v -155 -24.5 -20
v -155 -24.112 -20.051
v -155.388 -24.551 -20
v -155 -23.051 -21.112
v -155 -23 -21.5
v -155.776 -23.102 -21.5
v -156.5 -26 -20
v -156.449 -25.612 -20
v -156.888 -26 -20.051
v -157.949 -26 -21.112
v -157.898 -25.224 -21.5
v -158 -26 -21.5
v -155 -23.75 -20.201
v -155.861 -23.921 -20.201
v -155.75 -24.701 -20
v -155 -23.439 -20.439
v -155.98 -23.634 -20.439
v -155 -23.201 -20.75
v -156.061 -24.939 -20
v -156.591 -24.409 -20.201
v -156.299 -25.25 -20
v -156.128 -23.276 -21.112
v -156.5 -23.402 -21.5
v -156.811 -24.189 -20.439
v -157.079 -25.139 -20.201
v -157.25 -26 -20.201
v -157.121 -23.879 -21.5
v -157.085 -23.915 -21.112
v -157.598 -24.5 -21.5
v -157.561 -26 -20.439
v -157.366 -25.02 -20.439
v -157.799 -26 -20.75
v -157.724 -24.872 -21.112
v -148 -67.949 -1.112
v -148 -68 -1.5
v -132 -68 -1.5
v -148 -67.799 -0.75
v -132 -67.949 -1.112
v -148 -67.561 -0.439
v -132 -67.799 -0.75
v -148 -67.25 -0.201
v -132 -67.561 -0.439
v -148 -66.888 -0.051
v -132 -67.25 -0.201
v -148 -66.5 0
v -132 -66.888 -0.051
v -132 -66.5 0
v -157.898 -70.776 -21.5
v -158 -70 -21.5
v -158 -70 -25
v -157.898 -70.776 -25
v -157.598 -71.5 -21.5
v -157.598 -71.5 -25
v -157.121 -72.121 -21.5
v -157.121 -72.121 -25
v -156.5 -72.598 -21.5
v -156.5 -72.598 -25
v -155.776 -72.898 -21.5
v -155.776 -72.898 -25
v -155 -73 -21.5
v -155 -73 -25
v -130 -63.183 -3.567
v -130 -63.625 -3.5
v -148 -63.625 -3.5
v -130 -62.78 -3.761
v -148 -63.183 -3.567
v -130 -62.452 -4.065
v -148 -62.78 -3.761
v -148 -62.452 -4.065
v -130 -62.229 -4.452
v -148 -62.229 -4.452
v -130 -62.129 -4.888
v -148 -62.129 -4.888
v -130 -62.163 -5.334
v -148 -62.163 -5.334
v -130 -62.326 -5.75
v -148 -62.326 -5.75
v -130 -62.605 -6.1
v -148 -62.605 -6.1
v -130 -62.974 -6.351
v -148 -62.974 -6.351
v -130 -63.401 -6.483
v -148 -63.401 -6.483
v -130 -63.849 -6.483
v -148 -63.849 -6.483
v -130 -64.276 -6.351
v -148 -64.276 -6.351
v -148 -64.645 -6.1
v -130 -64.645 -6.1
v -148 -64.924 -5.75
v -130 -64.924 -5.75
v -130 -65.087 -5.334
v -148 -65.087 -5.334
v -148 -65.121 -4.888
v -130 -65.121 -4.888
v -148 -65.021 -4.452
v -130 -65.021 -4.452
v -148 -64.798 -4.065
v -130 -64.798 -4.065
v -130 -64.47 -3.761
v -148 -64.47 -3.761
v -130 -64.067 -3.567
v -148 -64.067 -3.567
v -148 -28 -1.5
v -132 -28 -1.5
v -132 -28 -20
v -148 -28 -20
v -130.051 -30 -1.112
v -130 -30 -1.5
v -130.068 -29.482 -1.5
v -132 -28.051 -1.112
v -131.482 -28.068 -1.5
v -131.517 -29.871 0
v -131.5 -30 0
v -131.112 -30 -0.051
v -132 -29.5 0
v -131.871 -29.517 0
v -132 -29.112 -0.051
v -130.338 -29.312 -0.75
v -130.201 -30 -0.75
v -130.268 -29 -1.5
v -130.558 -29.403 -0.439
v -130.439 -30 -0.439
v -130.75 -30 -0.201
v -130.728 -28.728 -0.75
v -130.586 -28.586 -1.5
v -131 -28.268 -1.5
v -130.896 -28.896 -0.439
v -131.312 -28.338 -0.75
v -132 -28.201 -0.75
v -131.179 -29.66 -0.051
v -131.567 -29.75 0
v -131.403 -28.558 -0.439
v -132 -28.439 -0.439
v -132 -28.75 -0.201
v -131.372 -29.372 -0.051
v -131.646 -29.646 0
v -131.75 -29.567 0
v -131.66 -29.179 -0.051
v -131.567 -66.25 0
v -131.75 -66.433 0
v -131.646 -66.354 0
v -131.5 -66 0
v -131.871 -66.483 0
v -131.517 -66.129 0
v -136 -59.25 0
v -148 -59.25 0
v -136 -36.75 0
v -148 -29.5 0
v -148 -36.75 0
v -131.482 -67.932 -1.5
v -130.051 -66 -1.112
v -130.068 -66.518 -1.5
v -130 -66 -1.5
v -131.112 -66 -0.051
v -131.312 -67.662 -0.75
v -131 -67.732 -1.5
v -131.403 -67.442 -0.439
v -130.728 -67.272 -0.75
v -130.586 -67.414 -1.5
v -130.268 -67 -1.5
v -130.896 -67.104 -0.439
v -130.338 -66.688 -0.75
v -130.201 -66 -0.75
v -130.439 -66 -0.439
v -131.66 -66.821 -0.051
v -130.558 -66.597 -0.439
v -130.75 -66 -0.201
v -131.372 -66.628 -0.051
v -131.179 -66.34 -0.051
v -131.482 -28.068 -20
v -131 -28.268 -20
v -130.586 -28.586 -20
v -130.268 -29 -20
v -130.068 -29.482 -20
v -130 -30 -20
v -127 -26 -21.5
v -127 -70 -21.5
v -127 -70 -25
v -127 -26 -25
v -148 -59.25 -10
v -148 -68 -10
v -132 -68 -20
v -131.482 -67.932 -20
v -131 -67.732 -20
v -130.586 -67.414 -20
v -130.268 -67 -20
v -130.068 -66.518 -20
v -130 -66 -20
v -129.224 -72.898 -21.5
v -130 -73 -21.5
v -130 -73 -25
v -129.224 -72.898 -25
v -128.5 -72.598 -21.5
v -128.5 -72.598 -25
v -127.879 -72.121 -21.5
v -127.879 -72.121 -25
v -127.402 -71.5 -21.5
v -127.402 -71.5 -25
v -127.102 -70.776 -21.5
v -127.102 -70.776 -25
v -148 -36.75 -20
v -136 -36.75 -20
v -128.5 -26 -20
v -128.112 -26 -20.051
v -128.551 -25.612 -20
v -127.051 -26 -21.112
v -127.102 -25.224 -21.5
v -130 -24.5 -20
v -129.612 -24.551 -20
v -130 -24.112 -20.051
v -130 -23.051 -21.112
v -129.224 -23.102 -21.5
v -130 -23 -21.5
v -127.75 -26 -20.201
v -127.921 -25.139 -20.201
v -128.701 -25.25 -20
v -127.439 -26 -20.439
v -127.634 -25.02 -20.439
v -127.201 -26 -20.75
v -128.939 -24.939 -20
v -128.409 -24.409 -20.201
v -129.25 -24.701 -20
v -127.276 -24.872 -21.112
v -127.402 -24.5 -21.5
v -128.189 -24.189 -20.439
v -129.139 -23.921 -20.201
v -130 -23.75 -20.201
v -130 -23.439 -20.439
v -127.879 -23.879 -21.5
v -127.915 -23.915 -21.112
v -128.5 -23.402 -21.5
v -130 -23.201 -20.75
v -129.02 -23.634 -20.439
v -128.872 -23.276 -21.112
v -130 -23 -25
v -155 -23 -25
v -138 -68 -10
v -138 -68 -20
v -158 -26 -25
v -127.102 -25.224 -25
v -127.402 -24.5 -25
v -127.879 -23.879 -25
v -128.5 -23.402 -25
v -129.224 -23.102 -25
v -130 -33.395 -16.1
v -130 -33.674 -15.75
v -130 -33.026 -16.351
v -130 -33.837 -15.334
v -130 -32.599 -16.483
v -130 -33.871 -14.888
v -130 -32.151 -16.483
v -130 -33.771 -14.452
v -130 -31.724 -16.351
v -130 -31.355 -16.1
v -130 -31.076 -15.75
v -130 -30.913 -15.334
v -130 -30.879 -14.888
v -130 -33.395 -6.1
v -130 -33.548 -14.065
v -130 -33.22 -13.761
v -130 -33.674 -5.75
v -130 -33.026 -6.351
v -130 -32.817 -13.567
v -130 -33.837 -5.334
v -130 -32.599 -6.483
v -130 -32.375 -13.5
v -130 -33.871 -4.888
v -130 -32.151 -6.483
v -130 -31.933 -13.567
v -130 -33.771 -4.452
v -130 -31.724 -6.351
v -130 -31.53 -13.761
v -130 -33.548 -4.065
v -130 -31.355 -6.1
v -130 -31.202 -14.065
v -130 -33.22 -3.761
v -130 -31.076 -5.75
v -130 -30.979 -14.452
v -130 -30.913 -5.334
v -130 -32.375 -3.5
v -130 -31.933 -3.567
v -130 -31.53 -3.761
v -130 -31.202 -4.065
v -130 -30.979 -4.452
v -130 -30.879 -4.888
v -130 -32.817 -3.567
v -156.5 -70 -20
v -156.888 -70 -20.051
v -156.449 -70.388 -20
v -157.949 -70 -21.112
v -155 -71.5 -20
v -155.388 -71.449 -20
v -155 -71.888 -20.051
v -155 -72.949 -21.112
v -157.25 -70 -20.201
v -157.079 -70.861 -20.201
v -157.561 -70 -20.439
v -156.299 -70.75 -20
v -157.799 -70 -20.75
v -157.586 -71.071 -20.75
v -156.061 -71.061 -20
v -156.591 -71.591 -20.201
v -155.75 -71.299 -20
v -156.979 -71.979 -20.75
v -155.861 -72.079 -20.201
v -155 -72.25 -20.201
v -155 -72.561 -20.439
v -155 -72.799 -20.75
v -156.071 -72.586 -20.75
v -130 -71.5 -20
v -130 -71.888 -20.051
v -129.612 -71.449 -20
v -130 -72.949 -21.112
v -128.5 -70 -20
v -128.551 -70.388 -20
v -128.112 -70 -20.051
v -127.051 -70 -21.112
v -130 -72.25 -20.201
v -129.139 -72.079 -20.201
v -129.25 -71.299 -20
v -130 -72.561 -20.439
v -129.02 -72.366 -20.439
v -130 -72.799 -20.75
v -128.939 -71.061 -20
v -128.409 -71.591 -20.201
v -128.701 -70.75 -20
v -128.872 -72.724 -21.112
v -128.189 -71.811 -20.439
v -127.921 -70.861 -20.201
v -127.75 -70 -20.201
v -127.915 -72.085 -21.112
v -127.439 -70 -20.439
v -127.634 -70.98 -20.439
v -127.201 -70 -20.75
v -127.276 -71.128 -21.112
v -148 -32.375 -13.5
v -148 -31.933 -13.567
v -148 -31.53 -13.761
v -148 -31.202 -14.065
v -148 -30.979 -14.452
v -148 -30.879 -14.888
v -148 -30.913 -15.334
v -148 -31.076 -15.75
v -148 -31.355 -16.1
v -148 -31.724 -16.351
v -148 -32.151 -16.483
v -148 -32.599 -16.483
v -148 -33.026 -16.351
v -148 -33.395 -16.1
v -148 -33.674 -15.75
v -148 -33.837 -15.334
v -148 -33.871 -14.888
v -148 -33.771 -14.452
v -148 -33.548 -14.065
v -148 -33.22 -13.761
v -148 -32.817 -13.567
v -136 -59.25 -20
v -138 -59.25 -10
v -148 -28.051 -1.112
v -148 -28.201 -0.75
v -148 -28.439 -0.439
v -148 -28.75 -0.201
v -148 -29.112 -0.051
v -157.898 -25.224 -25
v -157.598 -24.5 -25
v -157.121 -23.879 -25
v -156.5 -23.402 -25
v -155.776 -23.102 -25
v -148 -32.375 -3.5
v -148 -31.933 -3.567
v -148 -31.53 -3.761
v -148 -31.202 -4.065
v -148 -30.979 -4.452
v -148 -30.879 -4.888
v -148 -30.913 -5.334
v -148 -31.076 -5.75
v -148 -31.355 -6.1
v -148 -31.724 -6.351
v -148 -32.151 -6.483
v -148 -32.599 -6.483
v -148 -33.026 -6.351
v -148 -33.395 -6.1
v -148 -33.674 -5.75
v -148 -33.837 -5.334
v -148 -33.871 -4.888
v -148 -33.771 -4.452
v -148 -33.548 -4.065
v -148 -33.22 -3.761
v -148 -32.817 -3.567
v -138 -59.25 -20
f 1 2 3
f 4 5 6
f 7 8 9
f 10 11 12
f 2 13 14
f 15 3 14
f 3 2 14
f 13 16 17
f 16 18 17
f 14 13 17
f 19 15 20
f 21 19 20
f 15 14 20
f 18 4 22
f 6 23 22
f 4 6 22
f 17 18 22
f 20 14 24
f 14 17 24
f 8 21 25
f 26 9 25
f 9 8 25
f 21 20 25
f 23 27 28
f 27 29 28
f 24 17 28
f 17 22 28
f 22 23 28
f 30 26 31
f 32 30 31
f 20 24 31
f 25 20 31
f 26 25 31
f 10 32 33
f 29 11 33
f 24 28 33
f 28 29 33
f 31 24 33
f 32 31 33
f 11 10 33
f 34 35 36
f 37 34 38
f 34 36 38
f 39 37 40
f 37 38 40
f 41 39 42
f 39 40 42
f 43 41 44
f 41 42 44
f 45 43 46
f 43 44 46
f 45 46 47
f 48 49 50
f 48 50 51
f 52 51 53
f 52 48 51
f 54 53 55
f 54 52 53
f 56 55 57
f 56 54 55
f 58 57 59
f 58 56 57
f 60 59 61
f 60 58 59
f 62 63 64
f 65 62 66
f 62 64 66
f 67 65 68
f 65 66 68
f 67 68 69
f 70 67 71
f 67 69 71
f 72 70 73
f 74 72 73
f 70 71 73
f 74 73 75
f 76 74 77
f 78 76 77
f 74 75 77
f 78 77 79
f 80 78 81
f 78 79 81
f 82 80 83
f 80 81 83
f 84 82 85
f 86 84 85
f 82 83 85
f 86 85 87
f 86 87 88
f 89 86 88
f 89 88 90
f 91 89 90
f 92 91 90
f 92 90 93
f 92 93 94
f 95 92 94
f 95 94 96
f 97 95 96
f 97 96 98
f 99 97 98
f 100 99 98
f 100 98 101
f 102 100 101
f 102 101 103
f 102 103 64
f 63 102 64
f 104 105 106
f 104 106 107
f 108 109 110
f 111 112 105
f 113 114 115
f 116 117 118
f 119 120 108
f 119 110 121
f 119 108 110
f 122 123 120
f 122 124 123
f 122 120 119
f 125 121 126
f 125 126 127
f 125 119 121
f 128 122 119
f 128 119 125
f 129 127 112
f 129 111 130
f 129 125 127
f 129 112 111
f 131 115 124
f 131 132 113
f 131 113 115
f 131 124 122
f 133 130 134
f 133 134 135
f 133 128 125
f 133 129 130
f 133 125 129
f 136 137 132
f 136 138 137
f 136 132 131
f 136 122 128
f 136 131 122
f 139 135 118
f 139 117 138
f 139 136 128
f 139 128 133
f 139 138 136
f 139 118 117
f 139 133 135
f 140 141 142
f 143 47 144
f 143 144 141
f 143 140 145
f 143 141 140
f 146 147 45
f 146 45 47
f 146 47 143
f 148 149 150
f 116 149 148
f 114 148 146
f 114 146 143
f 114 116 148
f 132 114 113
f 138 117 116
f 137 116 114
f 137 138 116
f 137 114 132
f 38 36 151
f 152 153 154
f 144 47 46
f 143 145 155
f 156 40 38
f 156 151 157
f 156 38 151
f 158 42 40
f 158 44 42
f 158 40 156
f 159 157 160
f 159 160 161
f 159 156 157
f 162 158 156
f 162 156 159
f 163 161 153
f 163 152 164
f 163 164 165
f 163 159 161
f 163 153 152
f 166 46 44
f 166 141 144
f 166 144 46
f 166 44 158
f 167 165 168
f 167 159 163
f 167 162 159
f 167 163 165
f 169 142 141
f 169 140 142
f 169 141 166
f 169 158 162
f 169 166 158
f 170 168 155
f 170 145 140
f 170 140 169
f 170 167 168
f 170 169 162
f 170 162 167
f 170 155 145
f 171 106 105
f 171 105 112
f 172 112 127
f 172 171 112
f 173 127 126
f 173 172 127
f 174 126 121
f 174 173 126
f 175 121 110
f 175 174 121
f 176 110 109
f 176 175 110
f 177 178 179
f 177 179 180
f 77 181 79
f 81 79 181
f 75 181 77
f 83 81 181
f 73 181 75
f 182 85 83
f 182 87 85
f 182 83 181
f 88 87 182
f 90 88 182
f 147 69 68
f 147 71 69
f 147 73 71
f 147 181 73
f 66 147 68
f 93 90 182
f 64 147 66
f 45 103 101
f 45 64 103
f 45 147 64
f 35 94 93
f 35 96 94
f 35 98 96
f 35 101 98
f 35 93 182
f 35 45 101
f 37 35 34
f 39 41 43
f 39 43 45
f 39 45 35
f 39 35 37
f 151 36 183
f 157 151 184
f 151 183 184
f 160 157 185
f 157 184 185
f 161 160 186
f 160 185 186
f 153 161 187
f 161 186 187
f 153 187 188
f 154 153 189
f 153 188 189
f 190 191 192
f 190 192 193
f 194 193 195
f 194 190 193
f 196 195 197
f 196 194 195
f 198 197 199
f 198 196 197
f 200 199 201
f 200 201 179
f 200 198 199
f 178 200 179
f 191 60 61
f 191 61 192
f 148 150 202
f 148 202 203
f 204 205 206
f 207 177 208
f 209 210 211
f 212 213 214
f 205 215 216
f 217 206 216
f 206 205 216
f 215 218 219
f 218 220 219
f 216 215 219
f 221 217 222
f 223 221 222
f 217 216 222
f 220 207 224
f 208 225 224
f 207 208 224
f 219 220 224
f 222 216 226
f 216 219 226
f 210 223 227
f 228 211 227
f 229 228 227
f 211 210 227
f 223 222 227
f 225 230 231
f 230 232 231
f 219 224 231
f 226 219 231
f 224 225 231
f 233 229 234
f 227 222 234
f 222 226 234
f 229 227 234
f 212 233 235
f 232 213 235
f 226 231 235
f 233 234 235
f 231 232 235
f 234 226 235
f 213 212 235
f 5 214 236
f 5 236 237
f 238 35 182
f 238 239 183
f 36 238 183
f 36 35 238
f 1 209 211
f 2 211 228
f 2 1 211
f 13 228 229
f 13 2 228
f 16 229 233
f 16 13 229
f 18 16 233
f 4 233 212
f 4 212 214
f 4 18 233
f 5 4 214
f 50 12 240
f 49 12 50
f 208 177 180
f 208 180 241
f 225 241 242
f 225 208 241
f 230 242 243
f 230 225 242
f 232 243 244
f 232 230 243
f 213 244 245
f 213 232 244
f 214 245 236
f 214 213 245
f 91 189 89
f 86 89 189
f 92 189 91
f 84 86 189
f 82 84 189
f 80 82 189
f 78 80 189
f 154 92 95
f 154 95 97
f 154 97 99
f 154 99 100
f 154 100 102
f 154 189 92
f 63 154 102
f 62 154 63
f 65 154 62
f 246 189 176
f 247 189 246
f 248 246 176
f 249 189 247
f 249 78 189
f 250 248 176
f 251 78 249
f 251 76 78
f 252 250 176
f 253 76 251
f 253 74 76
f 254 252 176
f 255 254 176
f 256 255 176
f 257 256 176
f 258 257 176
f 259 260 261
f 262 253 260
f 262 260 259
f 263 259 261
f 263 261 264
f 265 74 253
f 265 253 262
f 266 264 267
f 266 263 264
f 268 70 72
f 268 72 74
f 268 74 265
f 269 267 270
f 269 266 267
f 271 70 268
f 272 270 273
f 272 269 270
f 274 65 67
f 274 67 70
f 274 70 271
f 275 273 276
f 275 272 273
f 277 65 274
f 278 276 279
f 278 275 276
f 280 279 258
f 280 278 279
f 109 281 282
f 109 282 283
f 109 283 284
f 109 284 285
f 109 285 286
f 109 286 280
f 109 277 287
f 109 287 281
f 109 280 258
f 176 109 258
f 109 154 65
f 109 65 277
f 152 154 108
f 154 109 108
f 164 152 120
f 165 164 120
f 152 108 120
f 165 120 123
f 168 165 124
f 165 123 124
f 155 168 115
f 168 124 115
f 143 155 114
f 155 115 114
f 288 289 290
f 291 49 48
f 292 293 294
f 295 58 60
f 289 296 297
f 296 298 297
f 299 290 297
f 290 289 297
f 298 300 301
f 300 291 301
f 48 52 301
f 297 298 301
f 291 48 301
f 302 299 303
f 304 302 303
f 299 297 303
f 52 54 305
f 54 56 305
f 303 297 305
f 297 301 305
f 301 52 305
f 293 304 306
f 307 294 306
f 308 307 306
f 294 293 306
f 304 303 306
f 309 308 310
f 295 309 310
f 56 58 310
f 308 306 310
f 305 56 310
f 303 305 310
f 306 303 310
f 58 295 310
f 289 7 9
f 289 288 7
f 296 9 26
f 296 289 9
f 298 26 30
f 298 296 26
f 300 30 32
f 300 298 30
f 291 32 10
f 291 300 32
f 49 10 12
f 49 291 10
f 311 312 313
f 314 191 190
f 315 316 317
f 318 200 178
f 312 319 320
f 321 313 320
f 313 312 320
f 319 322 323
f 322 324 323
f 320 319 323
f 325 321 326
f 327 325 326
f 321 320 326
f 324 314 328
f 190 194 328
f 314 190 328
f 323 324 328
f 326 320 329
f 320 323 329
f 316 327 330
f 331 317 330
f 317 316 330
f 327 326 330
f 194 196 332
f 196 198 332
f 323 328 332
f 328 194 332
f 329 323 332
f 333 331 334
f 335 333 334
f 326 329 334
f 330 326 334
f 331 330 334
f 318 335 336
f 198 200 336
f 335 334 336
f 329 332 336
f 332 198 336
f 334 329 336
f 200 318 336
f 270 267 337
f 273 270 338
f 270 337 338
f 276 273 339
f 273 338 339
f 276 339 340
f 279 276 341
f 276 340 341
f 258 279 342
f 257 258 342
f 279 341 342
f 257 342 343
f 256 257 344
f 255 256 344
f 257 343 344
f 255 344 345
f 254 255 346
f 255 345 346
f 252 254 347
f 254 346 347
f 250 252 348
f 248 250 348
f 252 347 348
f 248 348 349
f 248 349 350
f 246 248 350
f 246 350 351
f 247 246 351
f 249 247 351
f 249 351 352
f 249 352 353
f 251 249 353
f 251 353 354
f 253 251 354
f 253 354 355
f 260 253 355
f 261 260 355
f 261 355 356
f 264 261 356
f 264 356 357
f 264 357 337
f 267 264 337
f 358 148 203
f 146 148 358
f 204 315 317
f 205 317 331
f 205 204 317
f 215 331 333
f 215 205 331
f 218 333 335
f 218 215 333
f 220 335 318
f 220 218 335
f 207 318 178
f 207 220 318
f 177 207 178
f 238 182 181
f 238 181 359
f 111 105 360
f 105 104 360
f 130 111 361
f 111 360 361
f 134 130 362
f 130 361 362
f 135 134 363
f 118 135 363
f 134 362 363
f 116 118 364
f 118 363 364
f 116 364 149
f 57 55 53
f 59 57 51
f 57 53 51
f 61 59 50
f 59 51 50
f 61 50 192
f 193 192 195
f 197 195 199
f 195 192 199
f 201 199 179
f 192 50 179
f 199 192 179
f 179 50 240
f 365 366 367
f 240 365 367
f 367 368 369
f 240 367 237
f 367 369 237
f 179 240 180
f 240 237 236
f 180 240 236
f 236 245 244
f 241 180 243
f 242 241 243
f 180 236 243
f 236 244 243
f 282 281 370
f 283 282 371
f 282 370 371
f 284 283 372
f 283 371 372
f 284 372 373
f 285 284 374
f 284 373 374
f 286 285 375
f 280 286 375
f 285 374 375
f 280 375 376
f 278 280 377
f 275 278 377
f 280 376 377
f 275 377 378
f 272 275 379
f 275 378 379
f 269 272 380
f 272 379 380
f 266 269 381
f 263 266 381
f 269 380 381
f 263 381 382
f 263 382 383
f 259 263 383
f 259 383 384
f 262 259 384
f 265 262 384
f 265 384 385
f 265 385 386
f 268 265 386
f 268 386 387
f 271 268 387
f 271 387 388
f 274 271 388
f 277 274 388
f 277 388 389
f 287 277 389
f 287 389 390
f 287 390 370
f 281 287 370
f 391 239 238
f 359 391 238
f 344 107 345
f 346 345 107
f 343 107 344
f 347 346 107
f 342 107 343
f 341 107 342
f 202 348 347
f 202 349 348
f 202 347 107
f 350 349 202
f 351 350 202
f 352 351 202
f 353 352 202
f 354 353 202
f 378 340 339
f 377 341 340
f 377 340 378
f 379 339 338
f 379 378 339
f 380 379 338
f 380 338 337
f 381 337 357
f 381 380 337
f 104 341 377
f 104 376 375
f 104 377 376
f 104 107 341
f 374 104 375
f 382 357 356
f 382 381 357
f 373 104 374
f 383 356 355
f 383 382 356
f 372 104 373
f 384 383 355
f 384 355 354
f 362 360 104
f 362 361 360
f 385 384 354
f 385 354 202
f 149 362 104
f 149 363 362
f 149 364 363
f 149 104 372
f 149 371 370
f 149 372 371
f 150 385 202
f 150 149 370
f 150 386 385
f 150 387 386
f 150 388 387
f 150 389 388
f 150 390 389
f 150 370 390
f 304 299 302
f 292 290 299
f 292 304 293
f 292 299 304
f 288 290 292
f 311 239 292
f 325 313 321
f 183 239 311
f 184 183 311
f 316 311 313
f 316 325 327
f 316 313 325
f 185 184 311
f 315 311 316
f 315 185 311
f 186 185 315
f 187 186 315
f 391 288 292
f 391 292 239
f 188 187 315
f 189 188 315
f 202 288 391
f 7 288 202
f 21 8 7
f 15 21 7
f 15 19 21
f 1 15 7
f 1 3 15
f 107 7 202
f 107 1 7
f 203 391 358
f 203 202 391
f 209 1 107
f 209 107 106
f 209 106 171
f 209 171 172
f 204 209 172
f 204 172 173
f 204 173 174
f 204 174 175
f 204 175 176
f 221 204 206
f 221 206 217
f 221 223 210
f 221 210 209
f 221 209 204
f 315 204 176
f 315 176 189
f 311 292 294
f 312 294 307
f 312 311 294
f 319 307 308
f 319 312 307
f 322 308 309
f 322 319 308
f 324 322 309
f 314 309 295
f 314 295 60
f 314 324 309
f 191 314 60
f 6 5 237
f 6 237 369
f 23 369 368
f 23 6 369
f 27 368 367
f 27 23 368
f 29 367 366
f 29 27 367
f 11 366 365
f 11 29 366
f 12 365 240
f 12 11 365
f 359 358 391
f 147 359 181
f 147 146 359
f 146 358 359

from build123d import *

# Parameters (mm, degrees)
BOSS_EXTRUDE1_DEPTH = 20
BOSS_EXTRUDE2_DEPTH = 5
FILLET1_R           = 2
SKETCH4_W           = 10
SKETCH4_H           = 10
CUT_EXTRUDE1_DEPTH  = 8.75
SKETCH5_R           = 1.5
CUT_EXTRUDE2_DEPTH  = 22
FILLET2_R           = 1.5


with BuildPart() as part:
    # Sketch1 → Boss-Extrude1 (new body)
    with BuildSketch(Plane.XY):
        Polygon((-130, -28), (-148, -28), (-148, -36.75), (-136, -36.75), (-136, -59.25), (-148, -59.25), (-148, -68), (-130, -68), align=None)
    extrude(amount=-BOSS_EXTRUDE1_DEPTH)

    # Sketch3 → Boss-Extrude2 (add)
    with BuildSketch(Plane(origin=(0, 0, -20), x_dir=(-1, 0, 0), z_dir=(0, 0, -1))):
        with BuildLine():
            Line((155, -73), (130, -73))
            ThreePointArc((130, -73), (127.878679656, -72.121320344), (127, -70))
            Line((127, -70), (127, -26))
            ThreePointArc((127, -26), (127.878679656, -23.878679656), (130, -23))
            Line((130, -23), (155, -23))
            ThreePointArc((155, -23), (157.121320344, -23.878679656), (158, -26))
            Line((158, -26), (158, -70))
            ThreePointArc((158, -70), (157.121320344, -72.121320344), (155, -73))
        make_face()
    extrude(amount=BOSS_EXTRUDE2_DEPTH)

    # Fillet1
    fillet1_edges = [part.edges().sort_by_distance(p)[0] for p in [
        (-130, -68, -10),
        (-130, -28, -10),
    ]]
    fillet(fillet1_edges, radius=FILLET1_R)

    # Sketch4 → Cut-Extrude1 (cut)
    with BuildSketch(Plane.XZ.offset(68)):
        with Locations((-143, -15)):
            Rectangle(SKETCH4_W, SKETCH4_H)
    extrude(amount=-CUT_EXTRUDE1_DEPTH, mode=Mode.SUBTRACT)

    # Sketch5 → Cut-Extrude2 (cut, through all)
    with BuildSketch(Plane.ZY.offset(148)):
        with Locations((-5, -32.375)):
            Circle(SKETCH5_R)
        with Locations((-15, -32.375)):
            Circle(SKETCH5_R)
        with Locations((-5, -63.625)):
            Circle(SKETCH5_R)
    extrude(amount=-CUT_EXTRUDE2_DEPTH, mode=Mode.SUBTRACT)

    # Fillet2
    fillet2_edges = [part.edges().sort_by_distance(p)[0] for p in [
        (-157.121320344, -72.121320344, -20),
        (-158, -48, -20),
        (-157.121320344, -23.878679656, -20),
        (-142.5, -23, -20),
        (-127.878679656, -23.878679656, -20),
        (-127, -48, -20),
        (-127.878679656, -72.121320344, -20),
        (-142.5, -73, -20),
        (-130, -48, 0),
        (-140, -28, 0),
        (-130.585786438, -67.414213562, 0),
        (-130.585786438, -28.585786438, 0),
        (-140, -68, 0),
    ]]
    fillet(fillet2_edges, radius=FILLET2_R)


solid = part.part
